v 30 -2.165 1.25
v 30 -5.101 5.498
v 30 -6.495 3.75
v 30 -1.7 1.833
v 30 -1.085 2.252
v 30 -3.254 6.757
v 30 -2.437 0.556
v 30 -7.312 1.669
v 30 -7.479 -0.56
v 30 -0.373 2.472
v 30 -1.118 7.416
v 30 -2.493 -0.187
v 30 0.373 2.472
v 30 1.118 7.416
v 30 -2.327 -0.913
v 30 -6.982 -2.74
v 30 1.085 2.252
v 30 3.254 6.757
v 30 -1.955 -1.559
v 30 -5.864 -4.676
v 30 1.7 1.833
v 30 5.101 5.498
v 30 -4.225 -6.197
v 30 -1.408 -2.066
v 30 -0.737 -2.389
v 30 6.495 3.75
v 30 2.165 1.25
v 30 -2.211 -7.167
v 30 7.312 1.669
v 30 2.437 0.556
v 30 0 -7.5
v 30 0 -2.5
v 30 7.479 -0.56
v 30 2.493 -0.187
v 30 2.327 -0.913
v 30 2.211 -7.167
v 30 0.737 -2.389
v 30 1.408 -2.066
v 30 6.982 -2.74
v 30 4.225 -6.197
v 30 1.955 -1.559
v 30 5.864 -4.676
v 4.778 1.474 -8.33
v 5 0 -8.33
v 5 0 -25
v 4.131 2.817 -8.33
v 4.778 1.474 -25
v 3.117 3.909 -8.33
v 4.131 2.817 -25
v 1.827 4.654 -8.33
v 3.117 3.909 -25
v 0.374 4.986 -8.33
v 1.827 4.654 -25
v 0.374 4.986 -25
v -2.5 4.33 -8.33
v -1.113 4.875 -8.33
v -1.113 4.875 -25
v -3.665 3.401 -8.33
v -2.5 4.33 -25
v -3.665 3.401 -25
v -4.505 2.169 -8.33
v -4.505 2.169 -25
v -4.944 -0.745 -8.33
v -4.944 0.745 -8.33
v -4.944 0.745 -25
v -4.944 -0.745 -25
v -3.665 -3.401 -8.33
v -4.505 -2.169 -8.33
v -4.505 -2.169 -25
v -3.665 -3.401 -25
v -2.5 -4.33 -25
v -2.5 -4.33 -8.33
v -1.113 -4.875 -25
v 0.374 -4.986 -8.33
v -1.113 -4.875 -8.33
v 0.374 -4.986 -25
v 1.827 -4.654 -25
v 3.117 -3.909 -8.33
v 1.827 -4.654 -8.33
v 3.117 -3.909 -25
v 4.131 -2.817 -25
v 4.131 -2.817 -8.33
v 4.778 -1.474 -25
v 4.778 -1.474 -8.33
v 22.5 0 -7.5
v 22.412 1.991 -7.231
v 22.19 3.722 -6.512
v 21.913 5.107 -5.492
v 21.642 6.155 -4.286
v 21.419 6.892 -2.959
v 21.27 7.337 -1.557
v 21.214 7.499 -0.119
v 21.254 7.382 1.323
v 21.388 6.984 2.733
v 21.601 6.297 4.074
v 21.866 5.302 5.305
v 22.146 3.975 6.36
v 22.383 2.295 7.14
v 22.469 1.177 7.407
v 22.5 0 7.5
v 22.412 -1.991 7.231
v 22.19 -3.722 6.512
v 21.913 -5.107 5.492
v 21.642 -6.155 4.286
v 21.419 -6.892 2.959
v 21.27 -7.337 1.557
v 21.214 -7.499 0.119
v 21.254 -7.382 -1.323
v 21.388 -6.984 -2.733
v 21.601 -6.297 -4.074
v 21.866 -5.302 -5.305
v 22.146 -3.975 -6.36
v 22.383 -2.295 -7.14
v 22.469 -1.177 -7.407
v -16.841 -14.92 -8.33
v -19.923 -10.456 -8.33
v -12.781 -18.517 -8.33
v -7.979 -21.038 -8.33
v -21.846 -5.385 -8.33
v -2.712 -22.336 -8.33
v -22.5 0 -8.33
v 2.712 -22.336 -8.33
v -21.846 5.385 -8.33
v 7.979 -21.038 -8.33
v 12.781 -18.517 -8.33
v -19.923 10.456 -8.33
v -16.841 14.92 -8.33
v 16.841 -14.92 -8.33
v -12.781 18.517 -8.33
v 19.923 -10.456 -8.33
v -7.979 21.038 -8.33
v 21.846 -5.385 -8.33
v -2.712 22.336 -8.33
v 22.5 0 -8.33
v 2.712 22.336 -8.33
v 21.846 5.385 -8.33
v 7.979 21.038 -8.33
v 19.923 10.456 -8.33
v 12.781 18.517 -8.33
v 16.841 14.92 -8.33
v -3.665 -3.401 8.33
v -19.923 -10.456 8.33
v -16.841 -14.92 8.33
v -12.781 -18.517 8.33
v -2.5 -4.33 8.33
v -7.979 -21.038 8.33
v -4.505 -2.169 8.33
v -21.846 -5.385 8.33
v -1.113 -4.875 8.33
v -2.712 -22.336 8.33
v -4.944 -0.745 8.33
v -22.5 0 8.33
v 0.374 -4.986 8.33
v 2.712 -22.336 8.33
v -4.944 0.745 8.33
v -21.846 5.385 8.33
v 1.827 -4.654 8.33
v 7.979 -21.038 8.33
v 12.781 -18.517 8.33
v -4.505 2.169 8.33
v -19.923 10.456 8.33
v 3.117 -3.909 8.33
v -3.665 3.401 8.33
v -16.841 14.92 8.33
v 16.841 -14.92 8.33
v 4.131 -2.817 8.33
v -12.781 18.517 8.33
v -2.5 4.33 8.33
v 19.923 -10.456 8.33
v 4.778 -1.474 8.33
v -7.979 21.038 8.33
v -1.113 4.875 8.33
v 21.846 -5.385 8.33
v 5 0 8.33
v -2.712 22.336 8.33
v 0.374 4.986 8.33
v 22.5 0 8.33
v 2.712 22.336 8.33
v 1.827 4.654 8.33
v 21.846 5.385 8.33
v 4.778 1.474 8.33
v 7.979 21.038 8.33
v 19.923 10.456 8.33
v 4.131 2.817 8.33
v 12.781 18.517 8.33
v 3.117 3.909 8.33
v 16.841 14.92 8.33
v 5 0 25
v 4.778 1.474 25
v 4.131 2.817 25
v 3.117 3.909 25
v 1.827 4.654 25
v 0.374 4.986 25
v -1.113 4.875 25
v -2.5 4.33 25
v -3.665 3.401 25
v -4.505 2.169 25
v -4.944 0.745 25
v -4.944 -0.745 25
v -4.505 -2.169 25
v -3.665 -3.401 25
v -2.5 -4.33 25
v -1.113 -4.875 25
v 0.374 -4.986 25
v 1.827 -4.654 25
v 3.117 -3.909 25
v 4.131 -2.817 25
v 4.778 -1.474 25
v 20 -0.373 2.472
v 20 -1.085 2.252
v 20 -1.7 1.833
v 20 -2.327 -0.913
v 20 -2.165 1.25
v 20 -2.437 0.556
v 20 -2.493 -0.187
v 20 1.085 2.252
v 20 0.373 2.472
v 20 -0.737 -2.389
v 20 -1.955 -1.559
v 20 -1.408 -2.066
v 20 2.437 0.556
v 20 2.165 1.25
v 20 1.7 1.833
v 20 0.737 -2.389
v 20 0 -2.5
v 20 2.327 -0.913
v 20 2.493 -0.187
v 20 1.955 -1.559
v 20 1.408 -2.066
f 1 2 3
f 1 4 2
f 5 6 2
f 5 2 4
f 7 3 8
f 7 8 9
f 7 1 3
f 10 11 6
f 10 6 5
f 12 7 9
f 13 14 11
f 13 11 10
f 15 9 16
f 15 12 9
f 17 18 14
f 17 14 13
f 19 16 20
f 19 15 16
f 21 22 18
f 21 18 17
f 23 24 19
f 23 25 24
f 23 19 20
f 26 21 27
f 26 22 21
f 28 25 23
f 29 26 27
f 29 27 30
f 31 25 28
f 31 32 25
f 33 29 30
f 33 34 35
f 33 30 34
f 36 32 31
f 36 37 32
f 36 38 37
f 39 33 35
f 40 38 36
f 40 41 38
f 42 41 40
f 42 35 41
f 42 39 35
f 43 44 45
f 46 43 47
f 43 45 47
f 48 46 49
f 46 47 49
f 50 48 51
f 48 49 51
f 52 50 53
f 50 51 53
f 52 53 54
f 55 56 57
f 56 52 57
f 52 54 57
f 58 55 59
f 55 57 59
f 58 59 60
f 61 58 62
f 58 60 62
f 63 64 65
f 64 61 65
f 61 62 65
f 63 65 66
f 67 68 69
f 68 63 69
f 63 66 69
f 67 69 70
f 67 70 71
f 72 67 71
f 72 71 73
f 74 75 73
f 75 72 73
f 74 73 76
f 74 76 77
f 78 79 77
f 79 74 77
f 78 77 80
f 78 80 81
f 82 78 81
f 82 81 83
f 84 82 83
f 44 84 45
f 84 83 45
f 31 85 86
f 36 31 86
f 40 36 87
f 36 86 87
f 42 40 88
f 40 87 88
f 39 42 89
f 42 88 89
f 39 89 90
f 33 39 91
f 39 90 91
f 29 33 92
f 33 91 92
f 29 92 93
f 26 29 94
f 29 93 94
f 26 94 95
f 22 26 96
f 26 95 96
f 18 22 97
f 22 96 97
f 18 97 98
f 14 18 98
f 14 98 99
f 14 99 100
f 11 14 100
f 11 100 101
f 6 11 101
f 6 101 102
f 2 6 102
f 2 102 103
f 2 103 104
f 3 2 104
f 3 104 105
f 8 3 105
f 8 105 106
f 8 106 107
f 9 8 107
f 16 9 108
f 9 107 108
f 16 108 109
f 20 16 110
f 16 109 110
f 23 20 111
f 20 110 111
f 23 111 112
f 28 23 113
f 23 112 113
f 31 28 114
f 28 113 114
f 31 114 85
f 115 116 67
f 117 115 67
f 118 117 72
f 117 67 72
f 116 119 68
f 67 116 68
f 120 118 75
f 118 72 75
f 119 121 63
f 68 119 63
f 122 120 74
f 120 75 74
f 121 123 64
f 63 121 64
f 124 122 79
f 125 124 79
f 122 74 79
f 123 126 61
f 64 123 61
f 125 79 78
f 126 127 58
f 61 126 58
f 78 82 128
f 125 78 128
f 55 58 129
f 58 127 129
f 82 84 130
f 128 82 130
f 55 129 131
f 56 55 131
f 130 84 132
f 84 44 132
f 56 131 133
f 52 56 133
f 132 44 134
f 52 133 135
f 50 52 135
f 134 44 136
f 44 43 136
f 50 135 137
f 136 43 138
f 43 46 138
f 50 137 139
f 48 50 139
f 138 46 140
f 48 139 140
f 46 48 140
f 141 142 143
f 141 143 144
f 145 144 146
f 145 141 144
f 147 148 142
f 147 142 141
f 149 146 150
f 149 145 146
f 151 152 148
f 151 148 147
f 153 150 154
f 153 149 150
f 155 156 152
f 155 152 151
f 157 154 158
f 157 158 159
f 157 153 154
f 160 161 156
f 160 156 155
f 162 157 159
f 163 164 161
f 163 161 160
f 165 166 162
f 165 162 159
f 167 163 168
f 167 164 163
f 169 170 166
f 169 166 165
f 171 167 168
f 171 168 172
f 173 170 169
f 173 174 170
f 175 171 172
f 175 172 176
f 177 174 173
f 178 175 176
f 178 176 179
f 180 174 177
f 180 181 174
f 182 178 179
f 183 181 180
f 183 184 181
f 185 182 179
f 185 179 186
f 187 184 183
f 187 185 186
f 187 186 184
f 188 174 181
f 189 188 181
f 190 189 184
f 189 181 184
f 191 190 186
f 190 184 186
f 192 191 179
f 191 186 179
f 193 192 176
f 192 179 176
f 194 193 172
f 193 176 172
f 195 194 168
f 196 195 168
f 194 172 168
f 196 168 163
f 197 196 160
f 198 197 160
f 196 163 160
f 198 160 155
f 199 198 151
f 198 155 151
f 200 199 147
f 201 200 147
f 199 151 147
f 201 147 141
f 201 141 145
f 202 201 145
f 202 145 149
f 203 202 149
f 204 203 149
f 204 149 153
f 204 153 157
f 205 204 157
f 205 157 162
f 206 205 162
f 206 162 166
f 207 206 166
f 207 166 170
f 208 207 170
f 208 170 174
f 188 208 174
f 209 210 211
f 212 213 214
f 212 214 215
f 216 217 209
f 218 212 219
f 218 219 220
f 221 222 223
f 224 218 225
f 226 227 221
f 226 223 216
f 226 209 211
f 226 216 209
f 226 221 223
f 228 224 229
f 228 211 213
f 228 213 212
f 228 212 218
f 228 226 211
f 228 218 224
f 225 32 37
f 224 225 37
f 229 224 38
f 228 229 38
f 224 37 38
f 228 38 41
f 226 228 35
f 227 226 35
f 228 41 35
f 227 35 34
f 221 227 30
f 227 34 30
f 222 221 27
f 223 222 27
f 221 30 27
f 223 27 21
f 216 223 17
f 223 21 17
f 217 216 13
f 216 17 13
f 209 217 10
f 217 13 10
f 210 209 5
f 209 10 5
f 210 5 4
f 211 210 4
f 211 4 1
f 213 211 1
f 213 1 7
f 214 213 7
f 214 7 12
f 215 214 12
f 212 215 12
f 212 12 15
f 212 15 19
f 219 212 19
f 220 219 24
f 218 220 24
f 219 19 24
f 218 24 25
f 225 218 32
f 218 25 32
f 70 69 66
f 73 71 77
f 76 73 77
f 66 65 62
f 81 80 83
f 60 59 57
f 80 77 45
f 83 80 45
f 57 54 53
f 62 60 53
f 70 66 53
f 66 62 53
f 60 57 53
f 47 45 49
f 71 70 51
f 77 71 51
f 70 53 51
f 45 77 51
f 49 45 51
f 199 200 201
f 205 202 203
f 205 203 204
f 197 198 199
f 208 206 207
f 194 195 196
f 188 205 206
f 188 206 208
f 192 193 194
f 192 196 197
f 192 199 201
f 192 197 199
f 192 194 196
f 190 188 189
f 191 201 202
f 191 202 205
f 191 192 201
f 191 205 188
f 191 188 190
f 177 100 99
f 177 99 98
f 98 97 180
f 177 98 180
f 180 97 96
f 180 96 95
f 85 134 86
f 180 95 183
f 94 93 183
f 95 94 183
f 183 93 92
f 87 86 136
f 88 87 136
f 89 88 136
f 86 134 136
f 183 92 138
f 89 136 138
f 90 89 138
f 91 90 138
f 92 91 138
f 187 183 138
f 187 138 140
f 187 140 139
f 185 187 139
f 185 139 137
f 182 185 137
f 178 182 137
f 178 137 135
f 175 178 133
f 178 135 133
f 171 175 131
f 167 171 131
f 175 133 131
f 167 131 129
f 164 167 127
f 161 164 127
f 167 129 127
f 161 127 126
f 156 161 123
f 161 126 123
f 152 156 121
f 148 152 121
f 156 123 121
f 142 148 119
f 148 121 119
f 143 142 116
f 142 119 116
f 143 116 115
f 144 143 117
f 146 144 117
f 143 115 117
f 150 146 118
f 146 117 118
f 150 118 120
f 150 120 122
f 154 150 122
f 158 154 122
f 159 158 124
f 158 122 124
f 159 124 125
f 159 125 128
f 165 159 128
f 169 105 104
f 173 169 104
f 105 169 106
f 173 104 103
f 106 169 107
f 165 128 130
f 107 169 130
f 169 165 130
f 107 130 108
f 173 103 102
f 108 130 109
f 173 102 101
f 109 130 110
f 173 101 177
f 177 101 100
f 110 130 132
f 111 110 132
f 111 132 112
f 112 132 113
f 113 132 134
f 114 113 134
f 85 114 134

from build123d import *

# Parameters (mm, degrees)
BOSS_EXTRUDE1_DEPTH      = 8.33
BOSS_EXTRUDE1_DEPTH_BACK = 8.33
SKETCH1_R                = 22.5
BOSS_EXTRUDE2_START      = 10
SKETCH2_R                = 7.5
BOSS_EXTRUDE2_DEPTH      = 20
SKETCH3_R                = 2.5
CUT_EXTRUDE2_DEPTH       = 10
BOSS_EXTRUDE3_DEPTH      = 25
BOSS_EXTRUDE3_DEPTH_BACK = 25
SKETCH7_R                = 5


with BuildPart() as part:
    # Sketch1 → Boss-Extrude1 (new, two sides: drawn at the far end of the back side and taken through both)
    with BuildSketch(Plane.XY.offset(-BOSS_EXTRUDE1_DEPTH_BACK)):
        Circle(SKETCH1_R)
    extrude(amount=BOSS_EXTRUDE1_DEPTH + BOSS_EXTRUDE1_DEPTH_BACK)

    # Sketch2 → Boss-Extrude2 (add)
    with BuildSketch(Plane(origin=(0, 0, 0), x_dir=(0, 0, -1), z_dir=(1, 0, 0)).offset(BOSS_EXTRUDE2_START)):
        Circle(SKETCH2_R)
    extrude(amount=BOSS_EXTRUDE2_DEPTH)

    # Sketch3 → Cut-Extrude2 (cut)
    with BuildSketch(Plane(origin=(30, 0, 0), x_dir=(0, 0, -1), z_dir=(1, 0, 0))):
        Circle(SKETCH3_R)
    extrude(amount=-CUT_EXTRUDE2_DEPTH, mode=Mode.SUBTRACT)

    # Sketch7 → Boss-Extrude3 (add, two sides: drawn at the far end of the back side and taken through both)
    with BuildSketch(Plane.XY.offset(-BOSS_EXTRUDE3_DEPTH_BACK)):
        Circle(SKETCH7_R)
    extrude(amount=BOSS_EXTRUDE3_DEPTH + BOSS_EXTRUDE3_DEPTH_BACK)


solid = part.part
